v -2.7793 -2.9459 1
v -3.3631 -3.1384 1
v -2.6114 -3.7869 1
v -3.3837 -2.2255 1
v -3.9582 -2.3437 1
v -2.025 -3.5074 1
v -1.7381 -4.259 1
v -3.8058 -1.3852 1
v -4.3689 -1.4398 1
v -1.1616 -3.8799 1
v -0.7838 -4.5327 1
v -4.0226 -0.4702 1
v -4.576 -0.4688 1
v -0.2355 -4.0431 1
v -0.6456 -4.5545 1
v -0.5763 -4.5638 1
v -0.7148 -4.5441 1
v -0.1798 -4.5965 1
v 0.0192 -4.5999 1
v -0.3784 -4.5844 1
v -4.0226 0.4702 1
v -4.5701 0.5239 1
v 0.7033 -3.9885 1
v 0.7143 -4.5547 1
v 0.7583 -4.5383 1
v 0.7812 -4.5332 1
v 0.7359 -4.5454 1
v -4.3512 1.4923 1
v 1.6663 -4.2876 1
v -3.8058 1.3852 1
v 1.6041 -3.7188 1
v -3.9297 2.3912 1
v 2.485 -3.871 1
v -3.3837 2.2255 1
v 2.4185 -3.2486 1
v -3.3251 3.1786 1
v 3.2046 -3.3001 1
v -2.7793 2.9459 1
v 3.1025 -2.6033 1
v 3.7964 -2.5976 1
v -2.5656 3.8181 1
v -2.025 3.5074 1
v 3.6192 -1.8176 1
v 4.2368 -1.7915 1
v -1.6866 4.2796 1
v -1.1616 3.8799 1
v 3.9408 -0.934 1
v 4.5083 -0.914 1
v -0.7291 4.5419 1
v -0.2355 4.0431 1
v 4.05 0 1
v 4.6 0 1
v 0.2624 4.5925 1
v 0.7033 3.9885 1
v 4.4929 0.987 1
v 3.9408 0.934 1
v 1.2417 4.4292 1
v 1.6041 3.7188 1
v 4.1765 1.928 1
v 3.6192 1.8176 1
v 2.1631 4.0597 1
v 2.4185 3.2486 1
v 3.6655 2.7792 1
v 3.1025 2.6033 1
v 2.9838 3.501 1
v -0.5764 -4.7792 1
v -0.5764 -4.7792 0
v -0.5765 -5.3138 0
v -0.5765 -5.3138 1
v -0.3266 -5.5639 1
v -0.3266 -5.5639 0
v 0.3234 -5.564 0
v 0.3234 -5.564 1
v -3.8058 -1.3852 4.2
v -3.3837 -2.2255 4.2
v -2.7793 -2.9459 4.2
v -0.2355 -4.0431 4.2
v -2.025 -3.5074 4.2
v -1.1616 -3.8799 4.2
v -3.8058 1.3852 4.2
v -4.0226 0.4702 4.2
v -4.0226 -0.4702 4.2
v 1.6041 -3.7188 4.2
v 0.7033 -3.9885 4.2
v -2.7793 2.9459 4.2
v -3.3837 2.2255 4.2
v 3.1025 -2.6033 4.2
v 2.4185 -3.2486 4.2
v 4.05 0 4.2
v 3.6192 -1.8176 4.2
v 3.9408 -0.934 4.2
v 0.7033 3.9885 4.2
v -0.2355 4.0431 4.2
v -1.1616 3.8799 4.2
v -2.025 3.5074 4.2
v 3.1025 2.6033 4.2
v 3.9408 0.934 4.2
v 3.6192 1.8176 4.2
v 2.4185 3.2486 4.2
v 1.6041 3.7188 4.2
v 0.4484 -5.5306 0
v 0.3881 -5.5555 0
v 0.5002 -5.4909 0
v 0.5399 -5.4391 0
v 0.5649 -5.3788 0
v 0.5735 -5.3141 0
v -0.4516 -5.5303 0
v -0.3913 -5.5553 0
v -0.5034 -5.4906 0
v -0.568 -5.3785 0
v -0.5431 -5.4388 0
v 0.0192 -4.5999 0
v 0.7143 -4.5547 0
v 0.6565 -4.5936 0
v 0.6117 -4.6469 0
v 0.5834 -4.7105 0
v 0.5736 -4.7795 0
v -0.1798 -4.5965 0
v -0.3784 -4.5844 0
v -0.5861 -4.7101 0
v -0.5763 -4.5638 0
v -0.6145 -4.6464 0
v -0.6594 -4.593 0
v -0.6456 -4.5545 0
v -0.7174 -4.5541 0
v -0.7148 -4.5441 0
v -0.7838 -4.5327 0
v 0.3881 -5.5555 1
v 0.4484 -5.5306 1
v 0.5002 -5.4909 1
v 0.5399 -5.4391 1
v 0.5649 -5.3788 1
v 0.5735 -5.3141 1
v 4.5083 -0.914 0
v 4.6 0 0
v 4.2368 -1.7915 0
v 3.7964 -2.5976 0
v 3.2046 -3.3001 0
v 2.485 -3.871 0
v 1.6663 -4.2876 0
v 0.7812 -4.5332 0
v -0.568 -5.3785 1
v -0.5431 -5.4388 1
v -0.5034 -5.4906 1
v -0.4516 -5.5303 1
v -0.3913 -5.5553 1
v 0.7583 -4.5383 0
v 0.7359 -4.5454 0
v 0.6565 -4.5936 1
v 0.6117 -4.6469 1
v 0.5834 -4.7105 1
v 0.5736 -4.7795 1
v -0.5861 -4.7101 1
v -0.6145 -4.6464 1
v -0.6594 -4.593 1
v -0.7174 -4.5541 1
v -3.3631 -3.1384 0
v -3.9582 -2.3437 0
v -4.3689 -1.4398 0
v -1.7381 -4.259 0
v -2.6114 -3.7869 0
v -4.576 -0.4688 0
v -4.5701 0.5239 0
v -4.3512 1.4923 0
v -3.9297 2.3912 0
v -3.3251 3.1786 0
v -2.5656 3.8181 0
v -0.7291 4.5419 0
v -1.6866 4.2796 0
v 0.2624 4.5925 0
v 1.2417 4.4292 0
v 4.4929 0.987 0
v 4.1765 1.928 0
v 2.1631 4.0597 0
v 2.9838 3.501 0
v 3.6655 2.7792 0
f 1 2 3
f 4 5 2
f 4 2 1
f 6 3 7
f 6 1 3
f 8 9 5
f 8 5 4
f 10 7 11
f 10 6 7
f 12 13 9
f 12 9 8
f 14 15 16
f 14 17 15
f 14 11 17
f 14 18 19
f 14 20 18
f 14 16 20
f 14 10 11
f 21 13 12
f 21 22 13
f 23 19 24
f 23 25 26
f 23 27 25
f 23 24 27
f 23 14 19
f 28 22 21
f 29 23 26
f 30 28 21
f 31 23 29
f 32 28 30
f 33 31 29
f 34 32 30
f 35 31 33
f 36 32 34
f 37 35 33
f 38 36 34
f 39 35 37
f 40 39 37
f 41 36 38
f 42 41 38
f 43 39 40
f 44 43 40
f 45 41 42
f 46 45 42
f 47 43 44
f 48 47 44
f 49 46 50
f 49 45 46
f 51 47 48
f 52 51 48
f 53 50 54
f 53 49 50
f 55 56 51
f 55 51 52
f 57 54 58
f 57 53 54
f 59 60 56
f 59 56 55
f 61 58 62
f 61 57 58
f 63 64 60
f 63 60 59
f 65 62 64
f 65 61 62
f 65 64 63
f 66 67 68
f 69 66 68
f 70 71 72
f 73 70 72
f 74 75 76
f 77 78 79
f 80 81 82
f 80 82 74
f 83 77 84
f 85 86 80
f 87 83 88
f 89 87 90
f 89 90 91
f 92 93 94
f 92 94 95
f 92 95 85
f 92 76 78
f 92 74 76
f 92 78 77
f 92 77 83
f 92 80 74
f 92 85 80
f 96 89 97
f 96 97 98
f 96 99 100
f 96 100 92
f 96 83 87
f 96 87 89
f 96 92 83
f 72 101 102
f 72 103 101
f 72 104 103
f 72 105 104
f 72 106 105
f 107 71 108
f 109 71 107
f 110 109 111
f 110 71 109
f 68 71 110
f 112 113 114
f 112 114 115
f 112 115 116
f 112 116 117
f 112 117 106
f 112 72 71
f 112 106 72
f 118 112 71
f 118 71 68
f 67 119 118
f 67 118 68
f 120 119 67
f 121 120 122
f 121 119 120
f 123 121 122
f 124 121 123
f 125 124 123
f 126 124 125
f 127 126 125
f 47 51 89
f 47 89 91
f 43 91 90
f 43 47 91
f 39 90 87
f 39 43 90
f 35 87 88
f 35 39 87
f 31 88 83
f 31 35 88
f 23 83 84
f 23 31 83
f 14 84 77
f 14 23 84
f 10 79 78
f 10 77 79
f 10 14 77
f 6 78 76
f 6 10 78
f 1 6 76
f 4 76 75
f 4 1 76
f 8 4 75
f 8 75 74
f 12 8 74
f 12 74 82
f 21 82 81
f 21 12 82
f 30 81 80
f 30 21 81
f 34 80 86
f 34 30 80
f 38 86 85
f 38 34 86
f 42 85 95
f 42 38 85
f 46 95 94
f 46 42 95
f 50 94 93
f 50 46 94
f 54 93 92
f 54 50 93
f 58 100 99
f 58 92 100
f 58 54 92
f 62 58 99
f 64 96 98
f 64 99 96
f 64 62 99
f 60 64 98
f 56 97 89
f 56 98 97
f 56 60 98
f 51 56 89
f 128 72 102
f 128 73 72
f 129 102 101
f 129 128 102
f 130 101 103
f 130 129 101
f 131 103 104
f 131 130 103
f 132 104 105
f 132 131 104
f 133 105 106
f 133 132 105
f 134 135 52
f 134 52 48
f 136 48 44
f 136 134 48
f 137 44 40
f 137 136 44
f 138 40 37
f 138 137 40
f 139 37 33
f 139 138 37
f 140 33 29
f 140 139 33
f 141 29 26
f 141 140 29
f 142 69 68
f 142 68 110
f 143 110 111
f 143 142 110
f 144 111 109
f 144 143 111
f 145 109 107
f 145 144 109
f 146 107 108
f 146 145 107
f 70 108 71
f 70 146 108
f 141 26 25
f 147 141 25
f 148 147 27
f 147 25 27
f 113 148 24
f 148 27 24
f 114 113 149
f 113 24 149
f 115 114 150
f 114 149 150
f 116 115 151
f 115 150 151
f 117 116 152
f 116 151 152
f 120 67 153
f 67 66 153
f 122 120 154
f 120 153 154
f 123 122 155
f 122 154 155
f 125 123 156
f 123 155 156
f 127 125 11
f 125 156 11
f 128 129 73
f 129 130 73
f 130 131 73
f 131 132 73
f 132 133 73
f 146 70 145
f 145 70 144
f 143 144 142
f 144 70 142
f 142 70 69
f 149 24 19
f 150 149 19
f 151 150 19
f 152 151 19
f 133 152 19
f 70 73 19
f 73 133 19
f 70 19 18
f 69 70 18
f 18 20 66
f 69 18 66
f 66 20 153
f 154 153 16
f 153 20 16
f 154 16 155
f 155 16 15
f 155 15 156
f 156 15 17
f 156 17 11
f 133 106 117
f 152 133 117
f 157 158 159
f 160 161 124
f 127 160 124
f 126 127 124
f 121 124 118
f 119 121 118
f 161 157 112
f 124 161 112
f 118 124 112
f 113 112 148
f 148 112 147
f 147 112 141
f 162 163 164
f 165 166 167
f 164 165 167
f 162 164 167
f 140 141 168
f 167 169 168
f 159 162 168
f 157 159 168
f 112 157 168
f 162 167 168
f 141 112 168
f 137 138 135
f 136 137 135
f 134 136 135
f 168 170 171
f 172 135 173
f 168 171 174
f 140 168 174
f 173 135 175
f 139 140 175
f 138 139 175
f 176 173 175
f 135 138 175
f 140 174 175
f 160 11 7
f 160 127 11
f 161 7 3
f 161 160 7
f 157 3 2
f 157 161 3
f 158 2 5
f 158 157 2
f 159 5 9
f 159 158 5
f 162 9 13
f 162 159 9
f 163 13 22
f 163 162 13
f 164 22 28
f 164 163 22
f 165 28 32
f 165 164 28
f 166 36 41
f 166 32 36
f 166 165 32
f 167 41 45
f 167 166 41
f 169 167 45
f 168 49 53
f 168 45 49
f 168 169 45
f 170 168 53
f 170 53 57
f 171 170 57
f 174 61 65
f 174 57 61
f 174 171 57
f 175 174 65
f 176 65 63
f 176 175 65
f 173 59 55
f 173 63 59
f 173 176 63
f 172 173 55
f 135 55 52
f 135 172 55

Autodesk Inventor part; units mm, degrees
ref_plane "YZ Plane" through (0, 0, 0) normal (1, 0, 0) x (0, 1, 0)
ref_plane "XZ Plane" through (0, 0, 0) normal (0, 1, 0) x (-1, 0, 0)
ref_plane "XY Plane" through (0, 0, 0) normal (0, 0, 1) x (1, 0, 0)
sketch "Sketch1" plane through (0, 0, 0) normal (0, 0, 1) x (1, 0, 0)
  circle A0 centre (0, 0) radius 4.6
  dimension "d0" = 9.2
extrude "Extrusion1" add sketch "Sketch1" along normal blind 1
sketch "Sketch2" plane through (0, 0, 1) normal (0, 0, 1) x (1, 0, 0)
  circle A0 centre (0, 0) radius 4.05
  dimension "d3" = 8.1
extrude "Extrusion2" add sketch "Sketch2" along normal blind 3.2
sketch "Sketch3" plane through (0, 0, 0) normal (0, 0, -1) x (-1, 0, 0)
  line L0 (0, 0) -> (0, -4.6024)
  line L1 (0, -4.6024) -> (-0.5737, -4.5641)
  circle A0 centre (0, 0) radius 4.6 projected
  line L2 (-0.5737, -4.5641) -> (0.5763, -4.5638)
  line L3 (0.5763, -4.5638) -> (0.5766, -5.5638)
  line L4 (0.5766, -5.5638) -> (-0.5734, -5.5641)
  line L5 (-0.5734, -5.5641) -> (-0.5737, -4.5641)
  dimension "d6" = 0.575
  dimension "d7" = 1.15
  dimension "d8" = 1
extrude "Extrusion3" add sketch "Sketch3" against normal blind 1 contours A0 L3 L4 L5 L1
fillet "Fillet1" radius 0.25 4 edges at (0.5737, -4.5641, 0.5) (0.5734, -5.5641, 0.5) (-0.5763, -4.5638, 0.5) (-0.5766, -5.5638, 0.5)
properties part number "sensor"
